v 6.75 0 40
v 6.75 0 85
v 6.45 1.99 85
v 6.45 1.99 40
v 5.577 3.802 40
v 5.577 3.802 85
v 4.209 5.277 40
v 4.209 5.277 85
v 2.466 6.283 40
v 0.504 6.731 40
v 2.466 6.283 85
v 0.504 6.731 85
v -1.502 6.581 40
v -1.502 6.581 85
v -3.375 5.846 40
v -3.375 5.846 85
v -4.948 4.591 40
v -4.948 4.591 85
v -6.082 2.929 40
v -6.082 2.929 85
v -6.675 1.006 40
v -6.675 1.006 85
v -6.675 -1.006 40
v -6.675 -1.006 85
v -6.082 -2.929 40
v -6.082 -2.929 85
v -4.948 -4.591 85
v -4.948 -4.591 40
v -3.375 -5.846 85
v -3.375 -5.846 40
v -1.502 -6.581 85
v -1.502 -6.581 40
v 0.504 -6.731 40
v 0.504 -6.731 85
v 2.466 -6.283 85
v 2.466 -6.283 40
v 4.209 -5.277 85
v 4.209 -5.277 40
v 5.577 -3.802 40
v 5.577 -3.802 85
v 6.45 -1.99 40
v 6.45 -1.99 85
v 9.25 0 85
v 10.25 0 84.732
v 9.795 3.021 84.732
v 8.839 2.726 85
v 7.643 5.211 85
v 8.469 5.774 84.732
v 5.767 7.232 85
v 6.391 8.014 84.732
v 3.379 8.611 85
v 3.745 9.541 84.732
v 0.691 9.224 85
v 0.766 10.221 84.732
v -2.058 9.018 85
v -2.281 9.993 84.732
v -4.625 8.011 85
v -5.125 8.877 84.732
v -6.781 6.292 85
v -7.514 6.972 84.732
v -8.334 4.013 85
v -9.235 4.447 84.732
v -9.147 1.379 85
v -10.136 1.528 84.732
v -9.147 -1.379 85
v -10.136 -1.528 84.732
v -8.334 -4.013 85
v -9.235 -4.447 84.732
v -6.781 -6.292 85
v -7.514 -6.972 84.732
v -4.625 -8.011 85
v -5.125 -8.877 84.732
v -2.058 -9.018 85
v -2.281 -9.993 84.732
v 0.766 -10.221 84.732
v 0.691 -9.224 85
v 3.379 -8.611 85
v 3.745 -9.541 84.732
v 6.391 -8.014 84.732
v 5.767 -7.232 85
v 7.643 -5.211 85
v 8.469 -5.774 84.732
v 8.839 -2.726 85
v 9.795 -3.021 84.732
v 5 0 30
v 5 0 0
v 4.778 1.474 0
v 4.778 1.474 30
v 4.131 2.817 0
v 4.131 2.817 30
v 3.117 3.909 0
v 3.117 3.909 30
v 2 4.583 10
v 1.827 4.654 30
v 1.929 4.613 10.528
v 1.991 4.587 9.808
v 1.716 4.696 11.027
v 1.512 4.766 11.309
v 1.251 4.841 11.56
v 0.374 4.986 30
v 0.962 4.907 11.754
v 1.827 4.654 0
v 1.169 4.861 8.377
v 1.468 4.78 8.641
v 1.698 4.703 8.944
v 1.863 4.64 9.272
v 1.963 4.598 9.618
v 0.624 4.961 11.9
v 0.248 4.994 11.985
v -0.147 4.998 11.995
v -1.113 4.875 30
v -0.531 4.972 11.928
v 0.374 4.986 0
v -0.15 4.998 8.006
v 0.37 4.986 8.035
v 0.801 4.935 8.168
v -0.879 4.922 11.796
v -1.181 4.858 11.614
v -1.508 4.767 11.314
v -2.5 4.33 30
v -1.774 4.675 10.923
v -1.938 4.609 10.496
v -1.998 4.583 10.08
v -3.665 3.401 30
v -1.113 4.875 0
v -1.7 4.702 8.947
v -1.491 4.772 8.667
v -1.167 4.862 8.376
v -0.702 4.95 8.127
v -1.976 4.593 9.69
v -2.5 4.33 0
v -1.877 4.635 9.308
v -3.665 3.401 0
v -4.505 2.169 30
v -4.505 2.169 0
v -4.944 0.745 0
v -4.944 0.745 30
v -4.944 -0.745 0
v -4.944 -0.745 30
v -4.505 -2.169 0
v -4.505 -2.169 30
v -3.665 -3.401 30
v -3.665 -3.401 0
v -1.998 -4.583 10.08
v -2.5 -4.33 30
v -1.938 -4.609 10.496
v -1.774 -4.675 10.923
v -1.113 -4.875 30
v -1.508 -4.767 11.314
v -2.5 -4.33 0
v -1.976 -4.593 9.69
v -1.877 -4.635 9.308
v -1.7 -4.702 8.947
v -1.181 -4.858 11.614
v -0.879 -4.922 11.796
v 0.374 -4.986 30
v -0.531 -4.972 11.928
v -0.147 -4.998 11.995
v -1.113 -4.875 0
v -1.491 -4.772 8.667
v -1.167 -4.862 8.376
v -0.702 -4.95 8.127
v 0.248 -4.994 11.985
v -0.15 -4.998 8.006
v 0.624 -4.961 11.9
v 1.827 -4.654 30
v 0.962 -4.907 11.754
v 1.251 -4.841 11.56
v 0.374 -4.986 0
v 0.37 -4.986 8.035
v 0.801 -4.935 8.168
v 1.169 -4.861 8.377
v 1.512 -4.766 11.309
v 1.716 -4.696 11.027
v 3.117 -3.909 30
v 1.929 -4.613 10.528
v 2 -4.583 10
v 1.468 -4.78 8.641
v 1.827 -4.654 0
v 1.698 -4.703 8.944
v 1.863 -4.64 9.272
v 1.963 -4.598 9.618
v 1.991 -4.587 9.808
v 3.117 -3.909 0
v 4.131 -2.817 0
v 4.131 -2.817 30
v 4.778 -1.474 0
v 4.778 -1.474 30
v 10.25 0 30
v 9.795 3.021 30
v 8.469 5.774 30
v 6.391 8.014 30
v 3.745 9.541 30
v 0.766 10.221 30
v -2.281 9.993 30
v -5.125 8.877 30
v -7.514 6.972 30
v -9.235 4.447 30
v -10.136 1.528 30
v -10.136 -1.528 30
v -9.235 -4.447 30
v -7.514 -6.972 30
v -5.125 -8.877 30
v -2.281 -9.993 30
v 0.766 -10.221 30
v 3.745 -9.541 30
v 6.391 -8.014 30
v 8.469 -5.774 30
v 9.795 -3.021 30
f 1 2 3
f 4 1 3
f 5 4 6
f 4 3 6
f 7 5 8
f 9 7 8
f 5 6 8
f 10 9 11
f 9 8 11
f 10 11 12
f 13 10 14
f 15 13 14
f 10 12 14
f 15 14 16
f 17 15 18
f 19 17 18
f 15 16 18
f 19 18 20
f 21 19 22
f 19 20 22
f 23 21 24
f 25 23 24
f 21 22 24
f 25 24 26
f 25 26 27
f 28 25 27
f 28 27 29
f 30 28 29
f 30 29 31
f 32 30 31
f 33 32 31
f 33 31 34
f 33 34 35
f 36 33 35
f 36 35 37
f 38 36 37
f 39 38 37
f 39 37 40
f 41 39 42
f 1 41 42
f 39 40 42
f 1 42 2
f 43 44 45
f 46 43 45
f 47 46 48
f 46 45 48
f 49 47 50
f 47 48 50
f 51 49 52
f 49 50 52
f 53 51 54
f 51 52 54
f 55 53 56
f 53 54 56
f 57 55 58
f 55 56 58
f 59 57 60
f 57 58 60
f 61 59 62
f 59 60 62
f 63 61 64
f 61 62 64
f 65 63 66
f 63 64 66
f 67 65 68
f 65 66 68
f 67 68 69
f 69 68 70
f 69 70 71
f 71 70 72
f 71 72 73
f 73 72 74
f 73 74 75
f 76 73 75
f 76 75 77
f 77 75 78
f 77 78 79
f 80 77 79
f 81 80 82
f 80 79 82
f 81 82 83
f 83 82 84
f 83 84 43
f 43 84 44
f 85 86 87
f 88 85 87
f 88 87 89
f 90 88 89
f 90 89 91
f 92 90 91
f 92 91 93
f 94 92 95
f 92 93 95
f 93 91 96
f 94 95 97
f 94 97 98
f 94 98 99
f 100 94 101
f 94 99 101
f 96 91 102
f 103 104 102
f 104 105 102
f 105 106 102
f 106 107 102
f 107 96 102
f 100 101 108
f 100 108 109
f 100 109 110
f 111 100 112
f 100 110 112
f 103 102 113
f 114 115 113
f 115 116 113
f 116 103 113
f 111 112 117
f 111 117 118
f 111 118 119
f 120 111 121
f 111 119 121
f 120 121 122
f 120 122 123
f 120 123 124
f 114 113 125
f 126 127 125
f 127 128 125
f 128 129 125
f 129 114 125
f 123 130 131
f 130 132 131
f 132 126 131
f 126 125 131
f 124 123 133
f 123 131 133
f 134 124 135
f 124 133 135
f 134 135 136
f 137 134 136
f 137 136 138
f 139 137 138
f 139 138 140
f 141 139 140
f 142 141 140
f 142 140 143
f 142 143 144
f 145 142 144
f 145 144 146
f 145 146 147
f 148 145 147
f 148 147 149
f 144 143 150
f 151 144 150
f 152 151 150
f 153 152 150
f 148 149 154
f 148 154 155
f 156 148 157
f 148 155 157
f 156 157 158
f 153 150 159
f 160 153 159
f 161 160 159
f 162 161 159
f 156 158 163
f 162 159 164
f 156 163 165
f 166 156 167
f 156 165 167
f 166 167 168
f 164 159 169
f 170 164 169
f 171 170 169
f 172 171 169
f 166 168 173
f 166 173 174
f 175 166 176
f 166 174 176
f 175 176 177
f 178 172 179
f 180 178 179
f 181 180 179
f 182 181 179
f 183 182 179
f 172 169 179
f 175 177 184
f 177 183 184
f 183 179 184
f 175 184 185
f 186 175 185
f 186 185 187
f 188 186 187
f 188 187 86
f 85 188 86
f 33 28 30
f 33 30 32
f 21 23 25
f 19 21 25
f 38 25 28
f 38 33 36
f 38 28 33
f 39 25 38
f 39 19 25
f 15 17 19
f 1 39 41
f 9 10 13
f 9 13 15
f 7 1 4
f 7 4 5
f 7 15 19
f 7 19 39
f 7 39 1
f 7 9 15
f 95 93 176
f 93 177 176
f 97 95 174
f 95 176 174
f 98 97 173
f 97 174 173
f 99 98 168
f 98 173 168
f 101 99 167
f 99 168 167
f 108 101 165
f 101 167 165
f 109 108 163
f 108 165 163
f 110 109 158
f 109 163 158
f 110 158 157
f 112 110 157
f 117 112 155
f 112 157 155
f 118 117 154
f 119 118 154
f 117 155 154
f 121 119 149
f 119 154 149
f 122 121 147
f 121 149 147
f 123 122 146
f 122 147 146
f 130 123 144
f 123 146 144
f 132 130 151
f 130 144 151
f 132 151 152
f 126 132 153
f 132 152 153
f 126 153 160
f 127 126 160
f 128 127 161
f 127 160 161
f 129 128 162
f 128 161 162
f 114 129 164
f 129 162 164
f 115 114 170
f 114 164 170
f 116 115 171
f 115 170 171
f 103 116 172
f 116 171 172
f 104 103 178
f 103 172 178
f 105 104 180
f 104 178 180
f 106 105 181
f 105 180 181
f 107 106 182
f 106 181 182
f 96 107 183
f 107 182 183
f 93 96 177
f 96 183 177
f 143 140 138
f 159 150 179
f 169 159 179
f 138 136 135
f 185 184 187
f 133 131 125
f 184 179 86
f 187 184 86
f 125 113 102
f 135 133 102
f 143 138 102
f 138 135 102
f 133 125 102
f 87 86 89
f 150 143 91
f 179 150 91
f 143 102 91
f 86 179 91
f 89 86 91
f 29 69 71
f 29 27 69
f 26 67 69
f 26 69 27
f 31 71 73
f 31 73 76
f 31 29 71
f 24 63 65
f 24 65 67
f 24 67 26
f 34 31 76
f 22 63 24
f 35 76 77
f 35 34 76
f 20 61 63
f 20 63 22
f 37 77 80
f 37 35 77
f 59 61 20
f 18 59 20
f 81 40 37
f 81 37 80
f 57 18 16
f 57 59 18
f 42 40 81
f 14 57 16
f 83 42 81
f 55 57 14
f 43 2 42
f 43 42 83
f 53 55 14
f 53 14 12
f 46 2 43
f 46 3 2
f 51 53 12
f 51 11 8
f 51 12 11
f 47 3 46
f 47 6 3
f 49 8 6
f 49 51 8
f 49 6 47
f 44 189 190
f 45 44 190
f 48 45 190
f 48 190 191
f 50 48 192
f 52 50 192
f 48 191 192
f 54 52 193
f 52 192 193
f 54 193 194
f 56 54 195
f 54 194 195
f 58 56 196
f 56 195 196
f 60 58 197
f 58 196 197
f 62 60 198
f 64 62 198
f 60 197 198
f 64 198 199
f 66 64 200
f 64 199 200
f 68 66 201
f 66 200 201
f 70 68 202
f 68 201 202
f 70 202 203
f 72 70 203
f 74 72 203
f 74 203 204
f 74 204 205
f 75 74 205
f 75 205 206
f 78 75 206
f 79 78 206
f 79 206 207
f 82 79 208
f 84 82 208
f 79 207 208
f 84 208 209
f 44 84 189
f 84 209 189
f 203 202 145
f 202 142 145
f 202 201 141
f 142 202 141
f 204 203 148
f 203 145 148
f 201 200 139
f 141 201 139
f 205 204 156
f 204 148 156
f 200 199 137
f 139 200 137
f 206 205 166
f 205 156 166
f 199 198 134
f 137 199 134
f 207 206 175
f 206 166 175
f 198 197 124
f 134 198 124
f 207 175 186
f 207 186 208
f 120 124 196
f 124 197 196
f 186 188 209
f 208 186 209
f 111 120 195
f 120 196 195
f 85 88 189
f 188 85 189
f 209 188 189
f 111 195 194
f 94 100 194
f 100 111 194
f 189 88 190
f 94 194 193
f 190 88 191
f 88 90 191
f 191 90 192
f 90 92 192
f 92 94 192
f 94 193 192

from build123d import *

# Parameters (mm, degrees)
F0_R     = 5
F1_DEPTH = 30
F2_R     = 10.25
F3_DEPTH = 55
F4_R     = 6.75
F5_DEPTH = 45
F6_SIZE2 = 0.2679491924
F6_SIZE  = 1
F7_R     = 2
F8_DEPTH = 10


with BuildPart() as f1:
    # F0 (on Top) → F1 (new body)
    with BuildSketch(Plane.XY):
        Circle(F0_R)
    extrude(amount=F1_DEPTH)

    # F2 (on face) → F3 (join)
    with BuildSketch(Plane.XY.offset(30)):
        Circle(F2_R)
    extrude(amount=F3_DEPTH)

    # F4 (on face) → F5 (cut)
    with BuildSketch(Plane.XY.offset(85)):
        Circle(F4_R)
    extrude(amount=-F5_DEPTH, mode=Mode.SUBTRACT)

    # F6
    f6_edges = [f1.edges().sort_by_distance(p)[0] for p in [
        (-10.25, 0, 85),
    ]]
    f6_side = f1.faces().sort_by_distance((-9.960086, 0, 85))[0]
    chamfer(f6_edges, length=F6_SIZE, length2=F6_SIZE2, reference=f6_side)

    # F7 (on Front) → F8 (cut, symmetric)
    with BuildSketch(Plane.XZ):
        with Locations((0, 10)):
            Circle(F7_R)
    extrude(amount=F8_DEPTH, both=True, mode=Mode.SUBTRACT)


solid = f1.part
